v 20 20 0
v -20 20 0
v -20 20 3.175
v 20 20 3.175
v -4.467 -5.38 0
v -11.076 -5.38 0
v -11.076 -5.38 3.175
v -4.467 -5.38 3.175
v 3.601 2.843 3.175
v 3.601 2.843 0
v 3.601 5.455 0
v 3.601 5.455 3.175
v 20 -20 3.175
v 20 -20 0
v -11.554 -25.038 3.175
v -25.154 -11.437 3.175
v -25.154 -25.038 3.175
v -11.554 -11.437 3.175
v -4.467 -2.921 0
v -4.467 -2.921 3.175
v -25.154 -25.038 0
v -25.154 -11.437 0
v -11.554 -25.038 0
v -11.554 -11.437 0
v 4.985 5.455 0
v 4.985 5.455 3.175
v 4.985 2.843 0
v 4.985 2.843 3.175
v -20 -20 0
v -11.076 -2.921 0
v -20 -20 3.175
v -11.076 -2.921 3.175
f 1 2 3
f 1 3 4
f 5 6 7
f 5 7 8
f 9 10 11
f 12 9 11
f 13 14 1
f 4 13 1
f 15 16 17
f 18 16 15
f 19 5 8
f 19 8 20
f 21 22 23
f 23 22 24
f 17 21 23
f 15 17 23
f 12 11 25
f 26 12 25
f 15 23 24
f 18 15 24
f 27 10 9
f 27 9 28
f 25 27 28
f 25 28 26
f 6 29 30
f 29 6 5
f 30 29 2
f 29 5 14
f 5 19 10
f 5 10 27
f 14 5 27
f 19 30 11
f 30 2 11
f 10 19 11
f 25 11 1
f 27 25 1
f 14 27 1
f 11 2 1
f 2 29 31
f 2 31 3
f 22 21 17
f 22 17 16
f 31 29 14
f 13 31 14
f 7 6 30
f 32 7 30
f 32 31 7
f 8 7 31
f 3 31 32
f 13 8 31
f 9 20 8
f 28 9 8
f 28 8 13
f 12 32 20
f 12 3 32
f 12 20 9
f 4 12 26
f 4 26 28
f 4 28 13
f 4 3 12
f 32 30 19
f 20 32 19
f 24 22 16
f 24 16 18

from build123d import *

# Parameters (mm, degrees)
SKETCH_W     = 40
SKETCH_H     = 40
SKETCH_W_2   = 1.383169
SKETCH_H_2   = 2.612657
SKETCH_W_3   = 6.608488
SKETCH_H_3   = 2.458971
PAD_DEPTH    = 3.175
SKETCH001_W  = 13.600899
SKETCH001_H  = 13.600899
PAD001_DEPTH = 3.175


with BuildPart() as body:
    # Sketch → Pad (new body)
    with BuildSketch(Plane.XY):
        Rectangle(SKETCH_W, SKETCH_H)
        with Locations((4.292962, 4.14897)):
            Rectangle(SKETCH_W_2, SKETCH_H_2, mode=Mode.SUBTRACT)
        with Locations((-7.771367, -4.150059)):
            Rectangle(SKETCH_W_3, SKETCH_H_3, mode=Mode.SUBTRACT)
    extrude(amount=PAD_DEPTH)


with BuildPart() as body001:
    # Sketch001 → Pad001 (new body)
    with BuildSketch(Plane.XY):
        with Locations((-18.353994, -18.237635)):
            Rectangle(SKETCH001_W, SKETCH001_H)
    extrude(amount=PAD001_DEPTH)


solid = Compound([body.part, body001.part])
